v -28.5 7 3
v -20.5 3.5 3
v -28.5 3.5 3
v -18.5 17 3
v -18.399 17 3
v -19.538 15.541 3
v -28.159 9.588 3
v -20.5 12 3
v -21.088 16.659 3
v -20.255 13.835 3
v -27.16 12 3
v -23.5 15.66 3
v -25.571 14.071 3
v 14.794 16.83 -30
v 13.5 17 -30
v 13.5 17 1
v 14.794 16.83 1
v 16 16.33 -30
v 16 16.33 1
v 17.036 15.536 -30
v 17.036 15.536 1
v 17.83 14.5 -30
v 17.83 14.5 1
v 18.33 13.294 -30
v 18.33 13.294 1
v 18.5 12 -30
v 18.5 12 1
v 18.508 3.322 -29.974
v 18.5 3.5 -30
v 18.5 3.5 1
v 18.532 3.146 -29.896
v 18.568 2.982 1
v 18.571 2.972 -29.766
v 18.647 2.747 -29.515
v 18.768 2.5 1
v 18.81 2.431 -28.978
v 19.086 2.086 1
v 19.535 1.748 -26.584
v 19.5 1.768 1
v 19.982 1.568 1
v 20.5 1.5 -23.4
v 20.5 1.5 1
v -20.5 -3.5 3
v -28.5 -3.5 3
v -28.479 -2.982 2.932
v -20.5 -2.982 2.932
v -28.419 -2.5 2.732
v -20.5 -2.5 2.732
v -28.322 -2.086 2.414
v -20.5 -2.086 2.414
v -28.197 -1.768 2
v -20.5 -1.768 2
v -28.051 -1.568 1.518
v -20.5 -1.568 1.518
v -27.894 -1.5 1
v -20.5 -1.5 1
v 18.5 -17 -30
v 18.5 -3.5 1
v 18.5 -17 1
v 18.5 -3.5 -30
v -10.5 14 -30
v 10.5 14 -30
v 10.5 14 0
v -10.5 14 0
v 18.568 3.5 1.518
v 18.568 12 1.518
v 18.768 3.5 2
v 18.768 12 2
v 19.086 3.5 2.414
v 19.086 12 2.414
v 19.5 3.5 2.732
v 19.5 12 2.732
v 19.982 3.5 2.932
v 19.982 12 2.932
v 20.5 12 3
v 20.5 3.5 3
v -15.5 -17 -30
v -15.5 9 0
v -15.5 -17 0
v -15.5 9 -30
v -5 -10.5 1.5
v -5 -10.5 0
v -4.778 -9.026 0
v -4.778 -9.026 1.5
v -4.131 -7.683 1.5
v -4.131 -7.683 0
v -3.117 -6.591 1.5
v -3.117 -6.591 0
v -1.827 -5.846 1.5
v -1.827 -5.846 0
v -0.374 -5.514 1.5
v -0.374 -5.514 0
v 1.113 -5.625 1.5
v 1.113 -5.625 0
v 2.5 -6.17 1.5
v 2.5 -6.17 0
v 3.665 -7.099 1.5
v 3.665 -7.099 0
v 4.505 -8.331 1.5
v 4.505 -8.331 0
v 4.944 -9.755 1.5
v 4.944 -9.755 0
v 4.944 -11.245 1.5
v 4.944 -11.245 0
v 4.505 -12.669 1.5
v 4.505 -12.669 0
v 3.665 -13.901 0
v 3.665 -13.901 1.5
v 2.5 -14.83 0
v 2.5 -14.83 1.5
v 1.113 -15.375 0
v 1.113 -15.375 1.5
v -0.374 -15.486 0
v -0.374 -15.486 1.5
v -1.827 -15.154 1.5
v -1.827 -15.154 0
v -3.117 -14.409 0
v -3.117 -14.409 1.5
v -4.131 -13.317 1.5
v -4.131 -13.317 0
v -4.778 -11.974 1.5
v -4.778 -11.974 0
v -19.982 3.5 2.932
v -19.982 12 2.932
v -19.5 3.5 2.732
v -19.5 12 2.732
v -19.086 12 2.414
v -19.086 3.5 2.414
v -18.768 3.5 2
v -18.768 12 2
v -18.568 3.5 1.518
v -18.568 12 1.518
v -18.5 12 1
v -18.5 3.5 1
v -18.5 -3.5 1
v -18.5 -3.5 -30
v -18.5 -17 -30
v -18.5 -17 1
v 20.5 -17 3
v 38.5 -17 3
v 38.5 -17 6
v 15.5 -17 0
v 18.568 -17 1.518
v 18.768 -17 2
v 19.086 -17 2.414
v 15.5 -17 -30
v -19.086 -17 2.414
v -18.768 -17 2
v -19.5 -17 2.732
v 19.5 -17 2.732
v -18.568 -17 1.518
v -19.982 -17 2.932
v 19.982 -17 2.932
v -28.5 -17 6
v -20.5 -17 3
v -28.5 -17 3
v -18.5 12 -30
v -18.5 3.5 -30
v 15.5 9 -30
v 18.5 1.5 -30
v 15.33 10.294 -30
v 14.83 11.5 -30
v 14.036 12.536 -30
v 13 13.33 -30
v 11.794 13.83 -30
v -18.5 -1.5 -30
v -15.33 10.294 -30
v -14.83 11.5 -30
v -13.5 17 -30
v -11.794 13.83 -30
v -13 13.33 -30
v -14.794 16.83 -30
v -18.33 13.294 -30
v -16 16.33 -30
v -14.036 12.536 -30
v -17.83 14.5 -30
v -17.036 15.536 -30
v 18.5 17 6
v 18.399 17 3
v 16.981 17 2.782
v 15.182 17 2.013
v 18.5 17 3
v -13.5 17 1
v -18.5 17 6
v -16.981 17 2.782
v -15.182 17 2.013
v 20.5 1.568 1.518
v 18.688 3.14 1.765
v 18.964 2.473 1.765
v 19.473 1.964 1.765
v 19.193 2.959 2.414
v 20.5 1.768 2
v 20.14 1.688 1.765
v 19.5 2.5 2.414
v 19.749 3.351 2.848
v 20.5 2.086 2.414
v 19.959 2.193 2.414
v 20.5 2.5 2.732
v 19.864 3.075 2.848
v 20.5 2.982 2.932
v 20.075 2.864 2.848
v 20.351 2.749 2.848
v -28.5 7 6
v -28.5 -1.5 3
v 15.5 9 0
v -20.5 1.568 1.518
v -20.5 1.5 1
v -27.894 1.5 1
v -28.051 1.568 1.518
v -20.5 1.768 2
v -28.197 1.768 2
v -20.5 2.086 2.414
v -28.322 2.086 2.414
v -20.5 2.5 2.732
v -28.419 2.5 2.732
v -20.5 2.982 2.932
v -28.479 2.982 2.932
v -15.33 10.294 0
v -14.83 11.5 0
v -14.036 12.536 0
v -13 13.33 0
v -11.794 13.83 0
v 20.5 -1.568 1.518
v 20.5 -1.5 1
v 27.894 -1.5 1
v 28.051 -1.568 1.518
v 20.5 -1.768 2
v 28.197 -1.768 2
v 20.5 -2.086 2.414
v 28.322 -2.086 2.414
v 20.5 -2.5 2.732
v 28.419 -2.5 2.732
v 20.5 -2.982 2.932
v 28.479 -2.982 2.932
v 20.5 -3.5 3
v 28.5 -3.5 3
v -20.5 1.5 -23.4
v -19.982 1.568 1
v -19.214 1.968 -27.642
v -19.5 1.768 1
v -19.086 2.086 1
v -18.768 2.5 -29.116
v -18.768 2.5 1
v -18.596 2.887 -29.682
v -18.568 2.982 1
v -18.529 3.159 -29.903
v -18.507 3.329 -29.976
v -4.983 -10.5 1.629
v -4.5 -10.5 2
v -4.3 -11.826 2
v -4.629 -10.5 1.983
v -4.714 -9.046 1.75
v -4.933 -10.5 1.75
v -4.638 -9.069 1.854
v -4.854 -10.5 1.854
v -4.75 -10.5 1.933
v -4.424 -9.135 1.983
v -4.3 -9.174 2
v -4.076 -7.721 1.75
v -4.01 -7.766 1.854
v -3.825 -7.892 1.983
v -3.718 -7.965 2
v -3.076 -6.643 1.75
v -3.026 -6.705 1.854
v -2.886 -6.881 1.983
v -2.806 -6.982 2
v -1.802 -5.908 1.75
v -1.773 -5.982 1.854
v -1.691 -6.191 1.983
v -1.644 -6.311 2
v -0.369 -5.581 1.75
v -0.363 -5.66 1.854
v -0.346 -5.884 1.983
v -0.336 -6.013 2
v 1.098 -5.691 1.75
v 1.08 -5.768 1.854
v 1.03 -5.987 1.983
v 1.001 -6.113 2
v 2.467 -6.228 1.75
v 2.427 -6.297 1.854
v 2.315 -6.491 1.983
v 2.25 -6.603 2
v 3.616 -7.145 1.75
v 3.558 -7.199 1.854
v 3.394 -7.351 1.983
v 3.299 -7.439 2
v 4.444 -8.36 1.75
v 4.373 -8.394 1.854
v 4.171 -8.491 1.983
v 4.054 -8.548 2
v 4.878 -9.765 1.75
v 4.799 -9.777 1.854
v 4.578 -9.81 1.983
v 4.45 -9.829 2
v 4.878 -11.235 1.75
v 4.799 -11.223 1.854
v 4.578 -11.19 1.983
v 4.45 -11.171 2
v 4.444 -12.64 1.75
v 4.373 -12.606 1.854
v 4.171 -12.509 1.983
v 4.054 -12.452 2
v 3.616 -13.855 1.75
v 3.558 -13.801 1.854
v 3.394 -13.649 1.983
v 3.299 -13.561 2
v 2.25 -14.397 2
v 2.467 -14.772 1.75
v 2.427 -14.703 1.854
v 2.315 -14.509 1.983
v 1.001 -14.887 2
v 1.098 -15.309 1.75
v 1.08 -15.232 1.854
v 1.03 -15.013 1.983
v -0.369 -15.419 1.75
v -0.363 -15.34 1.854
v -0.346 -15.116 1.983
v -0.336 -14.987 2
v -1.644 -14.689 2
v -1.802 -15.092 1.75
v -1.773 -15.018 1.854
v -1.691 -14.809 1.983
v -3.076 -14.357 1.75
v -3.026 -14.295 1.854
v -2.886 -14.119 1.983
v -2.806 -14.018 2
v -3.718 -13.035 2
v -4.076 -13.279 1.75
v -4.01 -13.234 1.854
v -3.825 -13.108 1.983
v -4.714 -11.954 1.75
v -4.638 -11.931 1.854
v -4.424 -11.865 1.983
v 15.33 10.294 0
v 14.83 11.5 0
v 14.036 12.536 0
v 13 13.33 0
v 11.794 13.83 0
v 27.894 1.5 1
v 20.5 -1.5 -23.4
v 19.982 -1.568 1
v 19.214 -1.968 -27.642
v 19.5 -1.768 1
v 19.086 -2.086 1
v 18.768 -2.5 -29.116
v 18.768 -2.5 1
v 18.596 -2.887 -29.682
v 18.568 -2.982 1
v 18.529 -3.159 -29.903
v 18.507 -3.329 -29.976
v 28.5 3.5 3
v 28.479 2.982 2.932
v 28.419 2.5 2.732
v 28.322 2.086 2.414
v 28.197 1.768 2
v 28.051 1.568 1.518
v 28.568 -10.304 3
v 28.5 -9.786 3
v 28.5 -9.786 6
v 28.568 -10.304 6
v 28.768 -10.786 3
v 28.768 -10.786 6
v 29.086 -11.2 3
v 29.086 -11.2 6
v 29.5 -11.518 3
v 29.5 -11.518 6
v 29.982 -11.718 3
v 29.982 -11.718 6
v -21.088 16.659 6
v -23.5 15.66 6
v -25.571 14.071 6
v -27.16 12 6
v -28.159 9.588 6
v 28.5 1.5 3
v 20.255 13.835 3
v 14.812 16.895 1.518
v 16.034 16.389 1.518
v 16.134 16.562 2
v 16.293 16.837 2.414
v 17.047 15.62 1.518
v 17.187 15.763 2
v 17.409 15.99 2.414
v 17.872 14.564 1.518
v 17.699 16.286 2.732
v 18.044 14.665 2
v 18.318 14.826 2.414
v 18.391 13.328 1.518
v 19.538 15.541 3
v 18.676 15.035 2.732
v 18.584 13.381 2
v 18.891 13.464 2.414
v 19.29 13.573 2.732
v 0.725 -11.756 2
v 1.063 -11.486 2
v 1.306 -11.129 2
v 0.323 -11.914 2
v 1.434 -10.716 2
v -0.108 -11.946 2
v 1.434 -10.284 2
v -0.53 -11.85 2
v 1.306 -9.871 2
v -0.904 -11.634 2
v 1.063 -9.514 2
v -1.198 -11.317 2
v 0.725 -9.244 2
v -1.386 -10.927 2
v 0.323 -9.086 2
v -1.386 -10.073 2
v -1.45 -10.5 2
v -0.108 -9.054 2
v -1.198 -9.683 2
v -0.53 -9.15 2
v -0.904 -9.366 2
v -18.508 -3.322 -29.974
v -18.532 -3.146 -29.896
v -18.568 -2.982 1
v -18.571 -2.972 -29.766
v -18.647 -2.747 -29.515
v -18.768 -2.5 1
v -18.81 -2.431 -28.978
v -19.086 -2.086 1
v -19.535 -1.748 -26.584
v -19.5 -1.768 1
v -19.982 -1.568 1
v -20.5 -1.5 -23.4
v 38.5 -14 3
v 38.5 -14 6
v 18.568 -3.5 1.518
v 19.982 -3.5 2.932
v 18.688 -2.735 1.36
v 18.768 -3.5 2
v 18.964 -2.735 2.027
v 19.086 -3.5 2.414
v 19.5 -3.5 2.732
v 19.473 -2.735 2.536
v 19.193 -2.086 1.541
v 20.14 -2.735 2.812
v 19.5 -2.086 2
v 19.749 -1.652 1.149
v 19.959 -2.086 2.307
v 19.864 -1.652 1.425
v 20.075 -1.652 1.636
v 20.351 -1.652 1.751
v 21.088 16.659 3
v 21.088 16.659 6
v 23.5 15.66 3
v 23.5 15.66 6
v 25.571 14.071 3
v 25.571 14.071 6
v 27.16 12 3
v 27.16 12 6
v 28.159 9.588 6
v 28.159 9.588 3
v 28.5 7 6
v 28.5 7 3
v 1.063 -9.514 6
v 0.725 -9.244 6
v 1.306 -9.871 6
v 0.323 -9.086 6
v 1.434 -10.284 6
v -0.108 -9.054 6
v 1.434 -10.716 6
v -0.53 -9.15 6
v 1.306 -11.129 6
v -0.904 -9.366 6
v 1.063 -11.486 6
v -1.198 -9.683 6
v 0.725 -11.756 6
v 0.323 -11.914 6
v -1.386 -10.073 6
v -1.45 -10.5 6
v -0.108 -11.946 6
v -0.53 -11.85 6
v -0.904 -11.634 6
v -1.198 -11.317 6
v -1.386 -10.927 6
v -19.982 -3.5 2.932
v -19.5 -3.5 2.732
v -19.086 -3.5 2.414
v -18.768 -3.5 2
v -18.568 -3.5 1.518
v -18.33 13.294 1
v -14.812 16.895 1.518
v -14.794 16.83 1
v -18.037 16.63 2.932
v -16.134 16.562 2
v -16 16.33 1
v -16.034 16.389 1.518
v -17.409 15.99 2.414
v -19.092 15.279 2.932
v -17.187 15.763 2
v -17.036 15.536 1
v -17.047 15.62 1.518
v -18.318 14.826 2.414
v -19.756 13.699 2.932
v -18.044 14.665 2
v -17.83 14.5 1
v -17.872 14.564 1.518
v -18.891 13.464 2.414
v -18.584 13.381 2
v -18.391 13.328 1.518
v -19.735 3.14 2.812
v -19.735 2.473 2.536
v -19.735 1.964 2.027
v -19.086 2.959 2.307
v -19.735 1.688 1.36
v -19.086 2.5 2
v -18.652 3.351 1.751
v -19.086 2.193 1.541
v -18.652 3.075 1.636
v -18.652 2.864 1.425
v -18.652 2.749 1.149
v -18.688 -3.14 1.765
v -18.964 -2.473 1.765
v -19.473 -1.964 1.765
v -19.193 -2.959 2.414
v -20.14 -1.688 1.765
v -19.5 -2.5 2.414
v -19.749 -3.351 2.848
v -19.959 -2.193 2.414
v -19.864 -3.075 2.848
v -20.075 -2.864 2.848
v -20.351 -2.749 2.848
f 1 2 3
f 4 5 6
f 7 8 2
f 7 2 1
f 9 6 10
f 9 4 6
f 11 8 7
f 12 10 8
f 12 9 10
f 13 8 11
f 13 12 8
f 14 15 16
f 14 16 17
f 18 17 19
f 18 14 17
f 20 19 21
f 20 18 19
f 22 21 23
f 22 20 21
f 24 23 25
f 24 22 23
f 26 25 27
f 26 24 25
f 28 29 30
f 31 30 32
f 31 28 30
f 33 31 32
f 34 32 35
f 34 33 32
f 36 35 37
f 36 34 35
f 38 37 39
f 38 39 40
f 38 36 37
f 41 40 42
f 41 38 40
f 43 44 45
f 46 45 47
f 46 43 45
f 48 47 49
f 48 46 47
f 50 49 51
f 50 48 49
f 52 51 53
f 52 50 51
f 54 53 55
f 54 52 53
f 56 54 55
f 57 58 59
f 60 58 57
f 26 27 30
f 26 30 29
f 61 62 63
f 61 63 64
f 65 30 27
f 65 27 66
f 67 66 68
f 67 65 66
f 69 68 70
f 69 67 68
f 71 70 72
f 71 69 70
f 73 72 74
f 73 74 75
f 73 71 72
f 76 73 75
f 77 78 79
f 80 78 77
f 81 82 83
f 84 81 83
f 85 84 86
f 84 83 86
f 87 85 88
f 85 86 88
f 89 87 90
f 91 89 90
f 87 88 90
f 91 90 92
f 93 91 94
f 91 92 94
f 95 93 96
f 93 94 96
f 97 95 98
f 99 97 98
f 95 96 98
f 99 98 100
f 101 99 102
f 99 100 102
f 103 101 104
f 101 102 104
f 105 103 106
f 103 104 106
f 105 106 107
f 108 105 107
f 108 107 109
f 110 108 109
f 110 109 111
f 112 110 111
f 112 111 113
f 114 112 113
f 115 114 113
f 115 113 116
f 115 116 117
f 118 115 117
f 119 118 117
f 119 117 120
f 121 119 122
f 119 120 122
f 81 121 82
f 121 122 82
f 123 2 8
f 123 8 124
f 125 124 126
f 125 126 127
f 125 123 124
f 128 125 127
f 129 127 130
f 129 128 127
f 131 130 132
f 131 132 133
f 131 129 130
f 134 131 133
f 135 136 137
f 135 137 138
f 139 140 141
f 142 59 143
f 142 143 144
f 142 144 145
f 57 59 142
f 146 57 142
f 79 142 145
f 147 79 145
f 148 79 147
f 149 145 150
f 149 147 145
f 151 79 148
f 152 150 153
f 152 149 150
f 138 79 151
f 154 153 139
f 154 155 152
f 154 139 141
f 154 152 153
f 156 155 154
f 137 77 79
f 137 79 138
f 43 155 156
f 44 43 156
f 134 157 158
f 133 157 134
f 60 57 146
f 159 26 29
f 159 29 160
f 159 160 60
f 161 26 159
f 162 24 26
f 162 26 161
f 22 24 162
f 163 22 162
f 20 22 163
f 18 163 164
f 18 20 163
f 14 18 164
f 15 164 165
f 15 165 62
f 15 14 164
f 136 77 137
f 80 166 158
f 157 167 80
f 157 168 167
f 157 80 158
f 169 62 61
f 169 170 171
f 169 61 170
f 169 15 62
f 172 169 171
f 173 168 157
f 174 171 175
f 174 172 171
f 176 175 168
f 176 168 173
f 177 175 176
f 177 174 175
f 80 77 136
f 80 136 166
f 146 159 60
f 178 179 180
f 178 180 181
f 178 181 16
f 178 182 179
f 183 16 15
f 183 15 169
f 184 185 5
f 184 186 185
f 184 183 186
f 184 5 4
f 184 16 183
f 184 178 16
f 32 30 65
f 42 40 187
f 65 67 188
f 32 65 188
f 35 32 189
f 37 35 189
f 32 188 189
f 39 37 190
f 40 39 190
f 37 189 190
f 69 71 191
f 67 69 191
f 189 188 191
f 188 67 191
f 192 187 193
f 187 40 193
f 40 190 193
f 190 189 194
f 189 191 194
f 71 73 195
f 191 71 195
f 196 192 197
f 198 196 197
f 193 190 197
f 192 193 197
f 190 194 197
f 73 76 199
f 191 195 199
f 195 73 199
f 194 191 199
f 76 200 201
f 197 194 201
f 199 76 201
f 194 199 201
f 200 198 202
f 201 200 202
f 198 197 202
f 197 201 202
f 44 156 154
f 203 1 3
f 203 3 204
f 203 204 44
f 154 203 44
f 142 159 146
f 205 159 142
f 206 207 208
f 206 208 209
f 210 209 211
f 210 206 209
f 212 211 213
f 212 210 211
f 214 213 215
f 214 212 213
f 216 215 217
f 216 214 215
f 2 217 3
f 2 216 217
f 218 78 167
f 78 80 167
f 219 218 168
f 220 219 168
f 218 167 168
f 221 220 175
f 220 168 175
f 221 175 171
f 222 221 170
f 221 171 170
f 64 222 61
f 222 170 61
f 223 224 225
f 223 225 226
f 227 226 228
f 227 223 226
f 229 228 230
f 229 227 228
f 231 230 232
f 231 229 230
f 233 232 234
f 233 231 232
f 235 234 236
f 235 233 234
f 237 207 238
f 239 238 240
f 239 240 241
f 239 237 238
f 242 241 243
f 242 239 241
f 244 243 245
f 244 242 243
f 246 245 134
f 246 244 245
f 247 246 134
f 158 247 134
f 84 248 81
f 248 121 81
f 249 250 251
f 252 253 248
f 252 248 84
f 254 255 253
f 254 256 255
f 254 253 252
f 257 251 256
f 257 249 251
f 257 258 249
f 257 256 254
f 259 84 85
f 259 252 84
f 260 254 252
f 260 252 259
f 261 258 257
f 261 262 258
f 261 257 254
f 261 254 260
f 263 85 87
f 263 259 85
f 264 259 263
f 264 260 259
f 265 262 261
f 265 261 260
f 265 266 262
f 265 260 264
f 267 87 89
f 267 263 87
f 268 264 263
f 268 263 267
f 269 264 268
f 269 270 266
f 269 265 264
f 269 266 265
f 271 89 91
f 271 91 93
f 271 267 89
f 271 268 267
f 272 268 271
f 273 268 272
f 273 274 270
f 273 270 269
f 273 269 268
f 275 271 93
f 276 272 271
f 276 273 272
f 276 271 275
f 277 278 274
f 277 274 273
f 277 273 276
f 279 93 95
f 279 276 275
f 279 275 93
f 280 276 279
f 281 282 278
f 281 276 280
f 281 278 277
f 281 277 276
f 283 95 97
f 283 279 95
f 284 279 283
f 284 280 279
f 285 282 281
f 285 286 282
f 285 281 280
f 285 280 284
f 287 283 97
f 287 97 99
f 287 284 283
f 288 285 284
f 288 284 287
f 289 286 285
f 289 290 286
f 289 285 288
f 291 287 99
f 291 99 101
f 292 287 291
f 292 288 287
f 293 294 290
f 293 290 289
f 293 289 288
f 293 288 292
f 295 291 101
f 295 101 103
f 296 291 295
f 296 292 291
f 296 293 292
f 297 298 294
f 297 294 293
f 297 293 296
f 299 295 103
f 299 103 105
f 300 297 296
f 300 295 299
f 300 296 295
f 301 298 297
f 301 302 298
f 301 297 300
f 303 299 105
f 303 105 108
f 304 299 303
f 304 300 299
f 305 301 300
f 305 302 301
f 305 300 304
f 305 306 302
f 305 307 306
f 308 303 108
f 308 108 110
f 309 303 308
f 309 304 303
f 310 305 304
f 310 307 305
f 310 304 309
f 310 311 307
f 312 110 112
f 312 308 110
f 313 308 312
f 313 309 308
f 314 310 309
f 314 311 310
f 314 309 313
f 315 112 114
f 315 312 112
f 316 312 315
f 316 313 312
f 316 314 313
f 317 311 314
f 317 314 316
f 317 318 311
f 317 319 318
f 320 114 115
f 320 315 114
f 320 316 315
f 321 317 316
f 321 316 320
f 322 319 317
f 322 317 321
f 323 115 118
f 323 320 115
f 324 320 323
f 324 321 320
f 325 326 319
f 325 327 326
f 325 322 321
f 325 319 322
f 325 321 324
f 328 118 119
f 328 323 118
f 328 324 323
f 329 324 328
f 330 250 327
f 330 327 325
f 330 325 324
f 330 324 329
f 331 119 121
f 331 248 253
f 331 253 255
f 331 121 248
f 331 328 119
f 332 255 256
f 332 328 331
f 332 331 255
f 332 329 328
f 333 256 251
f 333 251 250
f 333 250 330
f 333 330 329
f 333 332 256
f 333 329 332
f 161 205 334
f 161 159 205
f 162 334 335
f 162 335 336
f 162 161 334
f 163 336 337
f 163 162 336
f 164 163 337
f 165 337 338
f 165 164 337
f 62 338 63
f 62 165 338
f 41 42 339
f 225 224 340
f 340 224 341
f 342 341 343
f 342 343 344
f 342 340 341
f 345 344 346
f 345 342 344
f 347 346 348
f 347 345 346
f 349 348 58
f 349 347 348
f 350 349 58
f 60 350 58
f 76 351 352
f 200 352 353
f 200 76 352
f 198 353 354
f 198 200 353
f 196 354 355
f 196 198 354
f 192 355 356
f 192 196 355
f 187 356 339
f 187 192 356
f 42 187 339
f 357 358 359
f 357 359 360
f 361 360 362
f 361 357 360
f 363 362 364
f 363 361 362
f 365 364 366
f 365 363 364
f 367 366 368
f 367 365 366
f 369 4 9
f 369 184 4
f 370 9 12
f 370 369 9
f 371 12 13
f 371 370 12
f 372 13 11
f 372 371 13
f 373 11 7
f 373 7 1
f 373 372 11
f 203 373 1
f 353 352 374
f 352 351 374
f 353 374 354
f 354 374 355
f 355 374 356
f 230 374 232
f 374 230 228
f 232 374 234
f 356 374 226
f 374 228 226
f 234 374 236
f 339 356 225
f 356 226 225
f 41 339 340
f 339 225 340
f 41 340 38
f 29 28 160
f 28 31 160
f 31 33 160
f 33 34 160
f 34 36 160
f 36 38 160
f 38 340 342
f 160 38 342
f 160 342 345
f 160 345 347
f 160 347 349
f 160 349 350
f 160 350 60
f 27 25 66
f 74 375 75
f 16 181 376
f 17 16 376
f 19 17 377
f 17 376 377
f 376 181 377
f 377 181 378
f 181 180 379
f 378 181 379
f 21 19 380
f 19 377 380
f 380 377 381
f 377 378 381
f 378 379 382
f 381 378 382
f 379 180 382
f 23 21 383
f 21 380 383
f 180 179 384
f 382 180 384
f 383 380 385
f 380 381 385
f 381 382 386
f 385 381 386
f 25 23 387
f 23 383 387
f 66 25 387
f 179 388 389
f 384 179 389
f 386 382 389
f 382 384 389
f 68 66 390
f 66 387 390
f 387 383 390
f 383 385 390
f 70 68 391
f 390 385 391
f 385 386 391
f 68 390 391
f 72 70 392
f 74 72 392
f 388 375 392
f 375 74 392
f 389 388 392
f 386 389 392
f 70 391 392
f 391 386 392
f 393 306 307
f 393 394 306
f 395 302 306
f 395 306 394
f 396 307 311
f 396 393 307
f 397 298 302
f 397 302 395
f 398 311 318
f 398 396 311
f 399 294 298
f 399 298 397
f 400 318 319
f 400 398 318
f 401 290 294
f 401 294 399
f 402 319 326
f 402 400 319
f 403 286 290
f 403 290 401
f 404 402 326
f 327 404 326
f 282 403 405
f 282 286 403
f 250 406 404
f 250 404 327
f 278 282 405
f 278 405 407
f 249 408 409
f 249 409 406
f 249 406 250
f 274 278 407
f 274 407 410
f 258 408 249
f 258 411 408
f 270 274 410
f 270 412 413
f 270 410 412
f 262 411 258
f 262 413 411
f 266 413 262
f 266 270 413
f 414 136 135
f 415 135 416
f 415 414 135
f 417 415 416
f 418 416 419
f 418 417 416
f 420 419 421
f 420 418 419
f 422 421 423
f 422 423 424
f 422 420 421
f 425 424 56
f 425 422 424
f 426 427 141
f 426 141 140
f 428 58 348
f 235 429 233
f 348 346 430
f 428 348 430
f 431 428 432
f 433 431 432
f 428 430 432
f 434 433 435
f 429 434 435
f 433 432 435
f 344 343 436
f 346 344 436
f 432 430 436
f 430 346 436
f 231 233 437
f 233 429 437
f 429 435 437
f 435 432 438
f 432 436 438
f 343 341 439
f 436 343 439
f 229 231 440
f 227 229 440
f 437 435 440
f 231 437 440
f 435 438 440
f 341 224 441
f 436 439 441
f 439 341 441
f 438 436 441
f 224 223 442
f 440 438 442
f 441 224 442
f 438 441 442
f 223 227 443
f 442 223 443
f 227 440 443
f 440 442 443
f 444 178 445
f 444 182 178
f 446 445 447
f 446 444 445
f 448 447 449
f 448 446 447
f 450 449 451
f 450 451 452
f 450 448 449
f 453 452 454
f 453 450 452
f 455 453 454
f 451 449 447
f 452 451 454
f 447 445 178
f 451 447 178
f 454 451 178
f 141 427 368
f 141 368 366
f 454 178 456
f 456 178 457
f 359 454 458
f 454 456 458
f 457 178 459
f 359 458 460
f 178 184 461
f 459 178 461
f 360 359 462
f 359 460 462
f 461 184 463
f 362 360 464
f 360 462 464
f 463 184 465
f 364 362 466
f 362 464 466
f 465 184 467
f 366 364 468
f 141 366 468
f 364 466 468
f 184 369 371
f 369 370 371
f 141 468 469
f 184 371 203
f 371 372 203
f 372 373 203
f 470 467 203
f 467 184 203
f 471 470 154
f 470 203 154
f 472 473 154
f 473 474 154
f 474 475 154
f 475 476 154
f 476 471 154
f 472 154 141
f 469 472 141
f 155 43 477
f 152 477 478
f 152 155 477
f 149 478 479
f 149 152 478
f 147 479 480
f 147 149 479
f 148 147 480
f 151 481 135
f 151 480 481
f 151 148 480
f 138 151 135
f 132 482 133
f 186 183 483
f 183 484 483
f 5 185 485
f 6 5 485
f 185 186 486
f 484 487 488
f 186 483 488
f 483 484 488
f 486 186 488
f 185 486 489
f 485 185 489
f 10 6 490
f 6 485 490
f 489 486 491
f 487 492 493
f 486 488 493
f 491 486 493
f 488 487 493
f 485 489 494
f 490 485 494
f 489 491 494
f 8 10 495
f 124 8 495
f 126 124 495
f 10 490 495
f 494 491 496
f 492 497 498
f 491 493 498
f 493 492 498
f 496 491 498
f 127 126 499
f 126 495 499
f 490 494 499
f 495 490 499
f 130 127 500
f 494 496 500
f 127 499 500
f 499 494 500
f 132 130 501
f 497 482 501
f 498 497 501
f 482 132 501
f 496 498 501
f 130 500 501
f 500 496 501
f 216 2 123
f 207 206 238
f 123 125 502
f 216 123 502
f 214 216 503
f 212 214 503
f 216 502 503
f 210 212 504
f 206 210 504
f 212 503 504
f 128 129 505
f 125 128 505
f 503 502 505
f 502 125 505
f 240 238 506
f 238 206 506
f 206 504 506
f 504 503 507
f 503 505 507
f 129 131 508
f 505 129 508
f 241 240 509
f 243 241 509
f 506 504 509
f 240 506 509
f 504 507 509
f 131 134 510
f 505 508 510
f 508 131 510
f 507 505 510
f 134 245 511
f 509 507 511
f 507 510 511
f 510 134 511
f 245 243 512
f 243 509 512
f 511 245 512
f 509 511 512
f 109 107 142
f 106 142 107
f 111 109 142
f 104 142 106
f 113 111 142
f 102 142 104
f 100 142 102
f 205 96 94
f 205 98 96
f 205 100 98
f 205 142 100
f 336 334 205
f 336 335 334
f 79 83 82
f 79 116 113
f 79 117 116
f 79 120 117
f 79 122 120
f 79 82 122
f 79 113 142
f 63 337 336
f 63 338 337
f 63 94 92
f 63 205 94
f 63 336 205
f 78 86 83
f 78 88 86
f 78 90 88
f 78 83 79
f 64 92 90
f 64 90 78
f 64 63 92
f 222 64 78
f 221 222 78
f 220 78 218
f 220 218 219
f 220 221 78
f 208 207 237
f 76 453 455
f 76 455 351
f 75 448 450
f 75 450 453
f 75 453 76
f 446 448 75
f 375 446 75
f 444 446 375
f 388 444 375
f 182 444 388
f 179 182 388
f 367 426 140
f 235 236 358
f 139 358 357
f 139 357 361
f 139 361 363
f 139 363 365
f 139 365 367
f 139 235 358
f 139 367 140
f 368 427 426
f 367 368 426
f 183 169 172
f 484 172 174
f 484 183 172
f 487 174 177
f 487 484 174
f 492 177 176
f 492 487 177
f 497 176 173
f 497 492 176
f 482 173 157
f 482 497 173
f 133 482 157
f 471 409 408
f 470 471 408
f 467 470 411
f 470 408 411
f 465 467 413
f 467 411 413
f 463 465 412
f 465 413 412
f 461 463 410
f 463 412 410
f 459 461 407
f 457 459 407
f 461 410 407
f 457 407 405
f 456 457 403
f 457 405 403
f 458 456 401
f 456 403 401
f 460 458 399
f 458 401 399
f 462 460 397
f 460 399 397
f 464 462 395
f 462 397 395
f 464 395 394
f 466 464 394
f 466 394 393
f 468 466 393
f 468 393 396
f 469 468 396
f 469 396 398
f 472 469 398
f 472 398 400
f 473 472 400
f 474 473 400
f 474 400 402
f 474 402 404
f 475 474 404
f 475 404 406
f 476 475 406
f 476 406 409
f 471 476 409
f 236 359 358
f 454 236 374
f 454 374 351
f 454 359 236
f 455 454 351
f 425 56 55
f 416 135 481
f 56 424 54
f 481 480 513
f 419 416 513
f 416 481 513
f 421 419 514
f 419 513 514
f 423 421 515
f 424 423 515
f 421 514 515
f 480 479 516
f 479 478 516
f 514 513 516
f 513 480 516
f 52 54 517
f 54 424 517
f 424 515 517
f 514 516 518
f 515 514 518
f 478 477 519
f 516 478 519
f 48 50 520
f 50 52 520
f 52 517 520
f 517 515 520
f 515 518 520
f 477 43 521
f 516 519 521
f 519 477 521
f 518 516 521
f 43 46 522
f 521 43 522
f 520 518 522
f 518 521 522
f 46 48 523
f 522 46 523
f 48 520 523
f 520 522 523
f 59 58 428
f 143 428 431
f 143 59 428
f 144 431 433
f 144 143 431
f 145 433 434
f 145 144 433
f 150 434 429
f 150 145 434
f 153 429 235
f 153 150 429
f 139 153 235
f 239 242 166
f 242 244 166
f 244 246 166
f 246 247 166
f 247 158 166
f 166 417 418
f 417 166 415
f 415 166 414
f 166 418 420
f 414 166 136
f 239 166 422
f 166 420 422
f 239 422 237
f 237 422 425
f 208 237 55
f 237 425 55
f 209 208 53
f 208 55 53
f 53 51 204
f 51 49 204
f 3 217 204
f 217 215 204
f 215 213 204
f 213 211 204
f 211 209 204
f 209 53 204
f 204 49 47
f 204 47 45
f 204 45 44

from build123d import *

# Parameters (mm, degrees)
BOSS_EXTRUDE1_DEPTH = 17
BOSS_EXTRUDE2_DEPTH = 1.5
SKETCH3_R           = 1.45
CUT_EXTRUDE1_DEPTH  = 45.735332792
FILLET1_R           = 10
SKETCH4_R           = 5
CUT_EXTRUDE4_DEPTH  = 2
FILLET2_R           = 0.5
SKETCH5_W           = 31
SKETCH5_H           = 3
BOSS_EXTRUDE3_DEPTH = 30
SKETCH6_W           = 3
SKETCH6_H           = 3
BOSS_EXTRUDE4_DEPTH = 10
CHAMFER1_SIZE2      = 10
CHAMFER1_SIZE       = 2.679491924
FILLET3_R           = 5
FILLET4_R           = 2


# Some blends are built 0.0001 mm under size
with BuildPart() as part:
    # Sketch1 → Boss-Extrude1 (new, symmetric)
    with BuildSketch(Plane(origin=(0, 0, 0), x_dir=(1, 0, 0), z_dir=(0, 1, 0))):
        Polygon((15.5, 0), (-15.5, 0), (-15.5, 30), (-18.5, 30), (-18.5, -3), (-28.5, -3), (-28.5, -6), (28.5, -6), (28.5, -3), (18.5, -3), (18.5, 30), (15.5, 30), align=None)
    extrude(amount=BOSS_EXTRUDE1_DEPTH, both=True)

    # Sketch2 → Boss-Extrude2 (add, symmetric)
    with BuildSketch(Plane(origin=(0, 0, 0), x_dir=(1, 0, 0), z_dir=(0, 1, 0))):
        Polygon((18.5, 30), (18.5, -3), (28.5, -3), align=None)
    boss_extrude2 = extrude(amount=BOSS_EXTRUDE2_DEPTH, both=True)

    # Mirror1: Boss-Extrude2 across plane
    add(boss_extrude2.mirror(Plane(origin=(0, 0, 0), x_dir=(0, 0, 1), z_dir=(1, 0, 0))))

    # Sketch3 → Cut-Extrude1 (cut, through all)
    with BuildSketch(Plane(origin=(0, 0, 0), x_dir=(-1, 0, 0), z_dir=(0, 0, -1))):
        with Locations((0, -10.5)):
            Circle(SKETCH3_R)
    extrude(amount=-CUT_EXTRUDE1_DEPTH, mode=Mode.SUBTRACT)

    # Fillet1
    fillet1_edges = [part.edges().sort_by_distance(p)[0] for p in [
        (28.5, 17, 4.5),
        (-28.5, 17, 4.5),
    ]]
    fillet(fillet1_edges, radius=FILLET1_R)

    # Sketch4 → Cut-Extrude4 (cut)
    with BuildSketch(Plane(origin=(0, 0, 0), x_dir=(-1, 0, 0), z_dir=(0, 0, -1))):
        with Locations((0, -10.5)):
            Circle(SKETCH4_R)
    extrude(amount=-CUT_EXTRUDE4_DEPTH, mode=Mode.SUBTRACT)

    # Fillet2
    fillet2_edges = [part.edges().sort_by_distance(p)[0] for p in [
        (5, -10.5, 2),
    ]]
    fillet(fillet2_edges, radius=FILLET2_R)

    # Sketch5 → Boss-Extrude3 (add)
    with BuildSketch(Plane(origin=(0, 0, 0), x_dir=(-1, 0, 0), z_dir=(0, 0, -1))):
        with Locations((0, 15.5)):
            Rectangle(SKETCH5_W, SKETCH5_H)
    extrude(amount=BOSS_EXTRUDE3_DEPTH)

    # Sketch6 → Boss-Extrude4 (add)
    with BuildSketch(Plane(origin=(28.5, 0, 0), x_dir=(0, 0, -1), z_dir=(1, 0, 0))):
        with Locations((-4.5, -15.5)):
            Rectangle(SKETCH6_W, SKETCH6_H)
    extrude(amount=BOSS_EXTRUDE4_DEPTH)

    # Chamfer1
    chamfer1_edges = [part.edges().sort_by_distance(p)[0] for p in [
        (28.5, -14, 4.5),
    ]]
    chamfer1_side = [part.faces().sort_by_distance(p)[0] for p in [
        (28.5, -13.946410162, 4.5),
    ]]
    chamfer(chamfer1_edges, length=CHAMFER1_SIZE - 0.0001, length2=CHAMFER1_SIZE2 - 0.0001, reference=chamfer1_side[0])  # a hair under: the kernel refuses the full size

    # Fillet3
    fillet3_edges = [part.edges().sort_by_distance(p)[0] for p in [
        (18.5, 17, -13.5),
        (15.5, 14, -15),
        (-18.5, 17, -13.5),
        (-15.5, 14, -15),
    ]]
    fillet(fillet3_edges, radius=FILLET3_R)

    # Fillet4
    # the kernel refuses this fillet: 2 mm, written as the material it adds along each edge
    with BuildSketch(Plane(origin=(-20.5, 3.5, 1), x_dir=(0, 0, 1), z_dir=(1, 0, 0))) as fillet4_piece_1_section:
        Polygon((0, 0), (FILLET4_R * 1.02, 0), (FILLET4_R * 1.02, FILLET4_R * 1.02), (0, FILLET4_R * 1.02), align=None)
    fillet4_piece_1 = extrude(amount=FILLET4_R * 1.02, mode=Mode.PRIVATE)
    fillet4_piece_1 = fillet4_piece_1 - Plane(origin=(-20.5, 3.5, 1), x_dir=(0, 0.7071067811865475, -0.7071067811865475), z_dir=(1, 0, 0)) * Sphere(FILLET4_R, mode=Mode.PRIVATE)
    add(fillet4_piece_1)
    with BuildSketch(Plane(origin=(20.5, 3.5, 1), x_dir=(-1, 0, 0), z_dir=(0, 0, 1))) as fillet4_piece_2_section:
        Polygon((0, 0), (FILLET4_R * 1.02, 0), (FILLET4_R * 1.02, FILLET4_R * 1.02), (0, FILLET4_R * 1.02), align=None)
    fillet4_piece_2 = extrude(amount=FILLET4_R * 1.02, mode=Mode.PRIVATE)
    fillet4_piece_2 = fillet4_piece_2 - Plane(origin=(20.5, 3.5, 1), x_dir=(0.7071067811865475, 0.7071067811865475, 0), z_dir=(0, 0, 1)) * Sphere(FILLET4_R, mode=Mode.PRIVATE)
    add(fillet4_piece_2)
    with BuildSketch(Plane(origin=(20.5, -3.5, 1), x_dir=(-1, 0, 0), z_dir=(0, 1, 0))) as fillet4_piece_3_section:
        Polygon((0, 0), (FILLET4_R * 1.02, 0), (FILLET4_R * 1.02, FILLET4_R * 1.02), (0, FILLET4_R * 1.02), align=None)
    fillet4_piece_3 = extrude(amount=FILLET4_R * 1.02, mode=Mode.PRIVATE)
    fillet4_piece_3 = fillet4_piece_3 - Plane(origin=(20.5, -3.5, 1), x_dir=(0.7071067811865474, 0, -0.7071067811865477), z_dir=(0, 1, 0)) * Sphere(FILLET4_R, mode=Mode.PRIVATE)
    add(fillet4_piece_3)
    with BuildSketch(Plane(origin=(-20.5, -3.5, 1), x_dir=(0, 1, 0), z_dir=(0, 0, 1))) as fillet4_piece_4_section:
        Polygon((0, 0), (FILLET4_R * 1.02, 0), (FILLET4_R * 1.02, -FILLET4_R * 1.02), (0, -FILLET4_R * 1.02), align=None)
    fillet4_piece_4 = extrude(amount=FILLET4_R * 1.02, mode=Mode.PRIVATE)
    fillet4_piece_4 = fillet4_piece_4 - Plane(origin=(-20.5, -3.5, 1), x_dir=(-0.7071067811865475, -0.7071067811865475, 0), z_dir=(0, 0, 1)) * Sphere(FILLET4_R, mode=Mode.PRIVATE)
    add(fillet4_piece_4)
    with BuildSketch(Plane(origin=(28.5, -11.320608076, 3), x_dir=(0, 1, 0), z_dir=(0, 0, 1))) as fillet4_piece_5:
        with BuildLine():
            CenterArc((FILLET4_R * 0.767332413902, -FILLET4_R), FILLET4_R, 90, 75.000391344)
            Line((-FILLET4_R * 0.19859518016, -FILLET4_R * 0.741187552406), (0, 0))
            Line((0, 0), (FILLET4_R * 0.767332413902, 0))
        make_face()
    extrude(amount=3)
    with BuildSketch(Plane(origin=(-18.5, 3.5, 3), x_dir=(-1, 0, 0), z_dir=(0, 1, 0))) as fillet4_piece_6:
        with BuildLine():
            CenterArc((FILLET4_R, -FILLET4_R), FILLET4_R, 90, 90)
            Line((0, -FILLET4_R), (0, 0))
            Line((0, 0), (FILLET4_R, 0))
        make_face()
    extrude(amount=8.5)
    with BuildSketch(Plane(origin=(18.5, 3.5, 3), x_dir=(1, 0, 0), z_dir=(0, 1, 0))) as fillet4_piece_7:
        with BuildLine():
            CenterArc((FILLET4_R, FILLET4_R), FILLET4_R, 180, 90)
            Line((0, FILLET4_R), (0, 0))
            Line((0, 0), (FILLET4_R, 0))
        make_face()
    extrude(amount=8.5)
    with BuildSketch(Plane(origin=(-13.5, 12, 3), x_dir=(0.8416879607506226, 0.5399642365263262, 0), z_dir=(0.5399642365263262, -0.8416879607506226, 0))) as fillet4_piece_8_section:
        with BuildLine():
            CenterArc((5 + FILLET4_R, -FILLET4_R), FILLET4_R, 90, 90)
            Line((5 + FILLET4_R, 0), (5, 0))
            Line((5, 0), (5, -FILLET4_R))
        make_face()
    fillet4_piece_8 = revolve(axis=Axis((-13.5, 12, 3), (0, 0, 1)), revolution_arc=147.318795695, mode=Mode.PRIVATE)
    fillet4_piece_8 = split(fillet4_piece_8, bisect_by=Plane(origin=(-17.113068515, 17, 2.473069622), z_dir=(0, -1, 0)), keep=Keep.TOP, mode=Mode.PRIVATE)
    add(fillet4_piece_8)
    with BuildSketch(Plane(origin=(13.5, 12, 3), x_dir=(-0.8416879607506225, 0.5399642365263265, 0), z_dir=(-0.5399642365263265, -0.8416879607506225, 0))) as fillet4_piece_9_section:
        with BuildLine():
            CenterArc((5 + FILLET4_R, FILLET4_R), FILLET4_R, 180, 90)
            Line((5, FILLET4_R), (5, 0))
            Line((5, 0), (5 + FILLET4_R, 0))
        make_face()
    fillet4_piece_9 = revolve(axis=Axis((13.5, 12, 3), (0, 0, -1)), revolution_arc=147.318795695, mode=Mode.PRIVATE)
    fillet4_piece_9 = split(fillet4_piece_9, bisect_by=Plane(origin=(17.113068943, 17, 2.473070036), z_dir=(0, -1, 0)), keep=Keep.TOP, mode=Mode.PRIVATE)
    add(fillet4_piece_9)
    with BuildSketch(Plane(origin=(18.5, -17, 3), x_dir=(1, 0, 0), z_dir=(0, 1, 0)), Plane(origin=(-18.5, -17, 3), x_dir=(0, 0, -1), z_dir=(0, 1, 0))) as fillet4_piece_10:
        with BuildLine():
            CenterArc((FILLET4_R, FILLET4_R), FILLET4_R, 180, 90)
            Line((0, FILLET4_R), (0, 0))
            Line((0, 0), (FILLET4_R, 0))
        make_face()
    extrude(amount=13.5)
    with BuildSketch(Plane(origin=(18.5, -1.5, -35), x_dir=(0, -1, 0), z_dir=(0, 0, 1))) as fillet4_piece_11_section:
        with BuildLine():
            CenterArc((FILLET4_R, FILLET4_R), FILLET4_R, 180, 90)
            Line((0, FILLET4_R), (0, 0))
            Line((0, 0), (FILLET4_R, 0))
        make_face()
    fillet4_piece_11 = extrude(amount=36, mode=Mode.PRIVATE)
    fillet4_piece_11 = split(fillet4_piece_11, bisect_by=Plane(origin=(23.03556841, -1.955982706, -15.032624248), z_dir=(-0.9570244044334735, 0, 0.290007395282871)), keep=Keep.TOP, mode=Mode.PRIVATE)
    add(fillet4_piece_11)
    with BuildSketch(Plane(origin=(20.5, -1.5, 3), x_dir=(0, -1, 0), z_dir=(1, 0, 0))) as fillet4_piece_12_section:
        with BuildLine():
            CenterArc((FILLET4_R, FILLET4_R), FILLET4_R, 180, 90)
            Line((0, FILLET4_R), (0, 0))
            Line((0, 0), (FILLET4_R, 0))
        make_face()
    fillet4_piece_12 = extrude(amount=13, mode=Mode.PRIVATE)
    fillet4_piece_12 = split(fillet4_piece_12, bisect_by=Plane(origin=(28.035474122, -1.949923656, 1.467064601), z_dir=(-0.9570244044334735, 0, 0.290007395282871)), keep=Keep.TOP, mode=Mode.PRIVATE)
    add(fillet4_piece_12)
    with BuildSketch(Plane(origin=(18.5, 1.5, -35), x_dir=(0, 1, 0), z_dir=(0, 0, 1))) as fillet4_piece_13_section:
        with BuildLine():
            CenterArc((FILLET4_R, -FILLET4_R), FILLET4_R, 90, 90)
            Line((0, -FILLET4_R), (0, 0))
            Line((0, 0), (FILLET4_R, 0))
        make_face()
    fillet4_piece_13 = extrude(amount=36, mode=Mode.PRIVATE)
    fillet4_piece_13 = split(fillet4_piece_13, bisect_by=Plane(origin=(23.03556841, 1.955982706, -15.032624248), z_dir=(-0.9570244044334735, 0, 0.290007395282871)), keep=Keep.TOP, mode=Mode.PRIVATE)
    add(fillet4_piece_13)
    with BuildSketch(Plane(origin=(20.5, 1.5, 3), x_dir=(0, 1, 0), z_dir=(1, 0, 0))) as fillet4_piece_14_section:
        with BuildLine():
            CenterArc((FILLET4_R, -FILLET4_R), FILLET4_R, 90, 90)
            Line((0, -FILLET4_R), (0, 0))
            Line((0, 0), (FILLET4_R, 0))
        make_face()
    fillet4_piece_14 = extrude(amount=13, mode=Mode.PRIVATE)
    fillet4_piece_14 = split(fillet4_piece_14, bisect_by=Plane(origin=(28.035474122, 1.949923656, 1.467064601), z_dir=(-0.9570244044334735, 0, 0.290007395282871)), keep=Keep.TOP, mode=Mode.PRIVATE)
    add(fillet4_piece_14)
    with BuildSketch(Plane(origin=(-20.5, 1.5, 3), x_dir=(0, 1, 0), z_dir=(-1, 0, 0))) as fillet4_piece_15_section:
        with BuildLine():
            CenterArc((FILLET4_R, FILLET4_R), FILLET4_R, 180, 90)
            Line((0, FILLET4_R), (0, 0))
            Line((0, 0), (FILLET4_R, 0))
        make_face()
    fillet4_piece_15 = extrude(amount=13, mode=Mode.PRIVATE)
    fillet4_piece_15 = split(fillet4_piece_15, bisect_by=Plane(origin=(-28.035474122, 1.949923656, 1.467064601), z_dir=(0.9570244044334735, 0, 0.290007395282871)), keep=Keep.TOP, mode=Mode.PRIVATE)
    add(fillet4_piece_15)
    with BuildSketch(Plane(origin=(-18.5, 1.5, -35), x_dir=(0, 1, 0), z_dir=(0, 0, 1))) as fillet4_piece_16_section:
        with BuildLine():
            CenterArc((FILLET4_R, FILLET4_R), FILLET4_R, 180, 90)
            Line((0, FILLET4_R), (0, 0))
            Line((0, 0), (FILLET4_R, 0))
        make_face()
    fillet4_piece_16 = extrude(amount=36, mode=Mode.PRIVATE)
    fillet4_piece_16 = split(fillet4_piece_16, bisect_by=Plane(origin=(-23.03556841, 1.955982706, -15.032624248), z_dir=(0.9570244044334735, 0, 0.290007395282871)), keep=Keep.TOP, mode=Mode.PRIVATE)
    add(fillet4_piece_16)
    with BuildSketch(Plane(origin=(-18.5, -1.5, -35), x_dir=(0, -1, 0), z_dir=(0, 0, 1))) as fillet4_piece_17_section:
        with BuildLine():
            CenterArc((FILLET4_R, -FILLET4_R), FILLET4_R, 90, 90)
            Line((0, -FILLET4_R), (0, 0))
            Line((0, 0), (FILLET4_R, 0))
        make_face()
    fillet4_piece_17 = extrude(amount=36, mode=Mode.PRIVATE)
    fillet4_piece_17 = split(fillet4_piece_17, bisect_by=Plane(origin=(-23.03556841, -1.955982706, -15.032624248), z_dir=(0.9570244044334735, 0, 0.290007395282871)), keep=Keep.TOP, mode=Mode.PRIVATE)
    add(fillet4_piece_17)
    with BuildSketch(Plane(origin=(-20.5, -1.5, 3), x_dir=(0, -1, 0), z_dir=(-1, 0, 0))) as fillet4_piece_18_section:
        with BuildLine():
            CenterArc((FILLET4_R, -FILLET4_R), FILLET4_R, 90, 90)
            Line((0, -FILLET4_R), (0, 0))
            Line((0, 0), (FILLET4_R, 0))
        make_face()
    fillet4_piece_18 = extrude(amount=13, mode=Mode.PRIVATE)
    fillet4_piece_18 = split(fillet4_piece_18, bisect_by=Plane(origin=(-28.035474122, -1.949923656, 1.467064601), z_dir=(0.9570244044334735, 0, 0.290007395282871)), keep=Keep.TOP, mode=Mode.PRIVATE)
    add(fillet4_piece_18)


solid = part.part
